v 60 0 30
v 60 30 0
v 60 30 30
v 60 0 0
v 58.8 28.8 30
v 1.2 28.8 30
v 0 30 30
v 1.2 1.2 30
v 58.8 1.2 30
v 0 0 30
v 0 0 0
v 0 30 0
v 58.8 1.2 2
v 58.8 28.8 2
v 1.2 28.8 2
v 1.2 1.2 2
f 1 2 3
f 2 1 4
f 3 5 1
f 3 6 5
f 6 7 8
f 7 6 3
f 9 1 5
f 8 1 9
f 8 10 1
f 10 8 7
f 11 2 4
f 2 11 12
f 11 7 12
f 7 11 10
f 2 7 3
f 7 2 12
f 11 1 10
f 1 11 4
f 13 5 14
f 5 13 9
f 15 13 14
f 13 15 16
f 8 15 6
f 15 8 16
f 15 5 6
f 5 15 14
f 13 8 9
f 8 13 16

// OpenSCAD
$fn = 32;

// ----------------------------------------------------------------------
// Open box: 1.2 mm walls
// ----------------------------------------------------------------------

// --- parameters (mm) ---
box_l = 60;               // outer length, X
box_w = 30;               // outer width, Y
box_h = 30;               // outer height, Z
wall = 1.2;               // wall thickness
floor = 2;                // floor thickness

difference() {
  cube([box_l, box_w, box_h]);
  translate([wall, wall, floor])
    cube([box_l - 2 * wall, box_w - 2 * wall, box_h]);
}
